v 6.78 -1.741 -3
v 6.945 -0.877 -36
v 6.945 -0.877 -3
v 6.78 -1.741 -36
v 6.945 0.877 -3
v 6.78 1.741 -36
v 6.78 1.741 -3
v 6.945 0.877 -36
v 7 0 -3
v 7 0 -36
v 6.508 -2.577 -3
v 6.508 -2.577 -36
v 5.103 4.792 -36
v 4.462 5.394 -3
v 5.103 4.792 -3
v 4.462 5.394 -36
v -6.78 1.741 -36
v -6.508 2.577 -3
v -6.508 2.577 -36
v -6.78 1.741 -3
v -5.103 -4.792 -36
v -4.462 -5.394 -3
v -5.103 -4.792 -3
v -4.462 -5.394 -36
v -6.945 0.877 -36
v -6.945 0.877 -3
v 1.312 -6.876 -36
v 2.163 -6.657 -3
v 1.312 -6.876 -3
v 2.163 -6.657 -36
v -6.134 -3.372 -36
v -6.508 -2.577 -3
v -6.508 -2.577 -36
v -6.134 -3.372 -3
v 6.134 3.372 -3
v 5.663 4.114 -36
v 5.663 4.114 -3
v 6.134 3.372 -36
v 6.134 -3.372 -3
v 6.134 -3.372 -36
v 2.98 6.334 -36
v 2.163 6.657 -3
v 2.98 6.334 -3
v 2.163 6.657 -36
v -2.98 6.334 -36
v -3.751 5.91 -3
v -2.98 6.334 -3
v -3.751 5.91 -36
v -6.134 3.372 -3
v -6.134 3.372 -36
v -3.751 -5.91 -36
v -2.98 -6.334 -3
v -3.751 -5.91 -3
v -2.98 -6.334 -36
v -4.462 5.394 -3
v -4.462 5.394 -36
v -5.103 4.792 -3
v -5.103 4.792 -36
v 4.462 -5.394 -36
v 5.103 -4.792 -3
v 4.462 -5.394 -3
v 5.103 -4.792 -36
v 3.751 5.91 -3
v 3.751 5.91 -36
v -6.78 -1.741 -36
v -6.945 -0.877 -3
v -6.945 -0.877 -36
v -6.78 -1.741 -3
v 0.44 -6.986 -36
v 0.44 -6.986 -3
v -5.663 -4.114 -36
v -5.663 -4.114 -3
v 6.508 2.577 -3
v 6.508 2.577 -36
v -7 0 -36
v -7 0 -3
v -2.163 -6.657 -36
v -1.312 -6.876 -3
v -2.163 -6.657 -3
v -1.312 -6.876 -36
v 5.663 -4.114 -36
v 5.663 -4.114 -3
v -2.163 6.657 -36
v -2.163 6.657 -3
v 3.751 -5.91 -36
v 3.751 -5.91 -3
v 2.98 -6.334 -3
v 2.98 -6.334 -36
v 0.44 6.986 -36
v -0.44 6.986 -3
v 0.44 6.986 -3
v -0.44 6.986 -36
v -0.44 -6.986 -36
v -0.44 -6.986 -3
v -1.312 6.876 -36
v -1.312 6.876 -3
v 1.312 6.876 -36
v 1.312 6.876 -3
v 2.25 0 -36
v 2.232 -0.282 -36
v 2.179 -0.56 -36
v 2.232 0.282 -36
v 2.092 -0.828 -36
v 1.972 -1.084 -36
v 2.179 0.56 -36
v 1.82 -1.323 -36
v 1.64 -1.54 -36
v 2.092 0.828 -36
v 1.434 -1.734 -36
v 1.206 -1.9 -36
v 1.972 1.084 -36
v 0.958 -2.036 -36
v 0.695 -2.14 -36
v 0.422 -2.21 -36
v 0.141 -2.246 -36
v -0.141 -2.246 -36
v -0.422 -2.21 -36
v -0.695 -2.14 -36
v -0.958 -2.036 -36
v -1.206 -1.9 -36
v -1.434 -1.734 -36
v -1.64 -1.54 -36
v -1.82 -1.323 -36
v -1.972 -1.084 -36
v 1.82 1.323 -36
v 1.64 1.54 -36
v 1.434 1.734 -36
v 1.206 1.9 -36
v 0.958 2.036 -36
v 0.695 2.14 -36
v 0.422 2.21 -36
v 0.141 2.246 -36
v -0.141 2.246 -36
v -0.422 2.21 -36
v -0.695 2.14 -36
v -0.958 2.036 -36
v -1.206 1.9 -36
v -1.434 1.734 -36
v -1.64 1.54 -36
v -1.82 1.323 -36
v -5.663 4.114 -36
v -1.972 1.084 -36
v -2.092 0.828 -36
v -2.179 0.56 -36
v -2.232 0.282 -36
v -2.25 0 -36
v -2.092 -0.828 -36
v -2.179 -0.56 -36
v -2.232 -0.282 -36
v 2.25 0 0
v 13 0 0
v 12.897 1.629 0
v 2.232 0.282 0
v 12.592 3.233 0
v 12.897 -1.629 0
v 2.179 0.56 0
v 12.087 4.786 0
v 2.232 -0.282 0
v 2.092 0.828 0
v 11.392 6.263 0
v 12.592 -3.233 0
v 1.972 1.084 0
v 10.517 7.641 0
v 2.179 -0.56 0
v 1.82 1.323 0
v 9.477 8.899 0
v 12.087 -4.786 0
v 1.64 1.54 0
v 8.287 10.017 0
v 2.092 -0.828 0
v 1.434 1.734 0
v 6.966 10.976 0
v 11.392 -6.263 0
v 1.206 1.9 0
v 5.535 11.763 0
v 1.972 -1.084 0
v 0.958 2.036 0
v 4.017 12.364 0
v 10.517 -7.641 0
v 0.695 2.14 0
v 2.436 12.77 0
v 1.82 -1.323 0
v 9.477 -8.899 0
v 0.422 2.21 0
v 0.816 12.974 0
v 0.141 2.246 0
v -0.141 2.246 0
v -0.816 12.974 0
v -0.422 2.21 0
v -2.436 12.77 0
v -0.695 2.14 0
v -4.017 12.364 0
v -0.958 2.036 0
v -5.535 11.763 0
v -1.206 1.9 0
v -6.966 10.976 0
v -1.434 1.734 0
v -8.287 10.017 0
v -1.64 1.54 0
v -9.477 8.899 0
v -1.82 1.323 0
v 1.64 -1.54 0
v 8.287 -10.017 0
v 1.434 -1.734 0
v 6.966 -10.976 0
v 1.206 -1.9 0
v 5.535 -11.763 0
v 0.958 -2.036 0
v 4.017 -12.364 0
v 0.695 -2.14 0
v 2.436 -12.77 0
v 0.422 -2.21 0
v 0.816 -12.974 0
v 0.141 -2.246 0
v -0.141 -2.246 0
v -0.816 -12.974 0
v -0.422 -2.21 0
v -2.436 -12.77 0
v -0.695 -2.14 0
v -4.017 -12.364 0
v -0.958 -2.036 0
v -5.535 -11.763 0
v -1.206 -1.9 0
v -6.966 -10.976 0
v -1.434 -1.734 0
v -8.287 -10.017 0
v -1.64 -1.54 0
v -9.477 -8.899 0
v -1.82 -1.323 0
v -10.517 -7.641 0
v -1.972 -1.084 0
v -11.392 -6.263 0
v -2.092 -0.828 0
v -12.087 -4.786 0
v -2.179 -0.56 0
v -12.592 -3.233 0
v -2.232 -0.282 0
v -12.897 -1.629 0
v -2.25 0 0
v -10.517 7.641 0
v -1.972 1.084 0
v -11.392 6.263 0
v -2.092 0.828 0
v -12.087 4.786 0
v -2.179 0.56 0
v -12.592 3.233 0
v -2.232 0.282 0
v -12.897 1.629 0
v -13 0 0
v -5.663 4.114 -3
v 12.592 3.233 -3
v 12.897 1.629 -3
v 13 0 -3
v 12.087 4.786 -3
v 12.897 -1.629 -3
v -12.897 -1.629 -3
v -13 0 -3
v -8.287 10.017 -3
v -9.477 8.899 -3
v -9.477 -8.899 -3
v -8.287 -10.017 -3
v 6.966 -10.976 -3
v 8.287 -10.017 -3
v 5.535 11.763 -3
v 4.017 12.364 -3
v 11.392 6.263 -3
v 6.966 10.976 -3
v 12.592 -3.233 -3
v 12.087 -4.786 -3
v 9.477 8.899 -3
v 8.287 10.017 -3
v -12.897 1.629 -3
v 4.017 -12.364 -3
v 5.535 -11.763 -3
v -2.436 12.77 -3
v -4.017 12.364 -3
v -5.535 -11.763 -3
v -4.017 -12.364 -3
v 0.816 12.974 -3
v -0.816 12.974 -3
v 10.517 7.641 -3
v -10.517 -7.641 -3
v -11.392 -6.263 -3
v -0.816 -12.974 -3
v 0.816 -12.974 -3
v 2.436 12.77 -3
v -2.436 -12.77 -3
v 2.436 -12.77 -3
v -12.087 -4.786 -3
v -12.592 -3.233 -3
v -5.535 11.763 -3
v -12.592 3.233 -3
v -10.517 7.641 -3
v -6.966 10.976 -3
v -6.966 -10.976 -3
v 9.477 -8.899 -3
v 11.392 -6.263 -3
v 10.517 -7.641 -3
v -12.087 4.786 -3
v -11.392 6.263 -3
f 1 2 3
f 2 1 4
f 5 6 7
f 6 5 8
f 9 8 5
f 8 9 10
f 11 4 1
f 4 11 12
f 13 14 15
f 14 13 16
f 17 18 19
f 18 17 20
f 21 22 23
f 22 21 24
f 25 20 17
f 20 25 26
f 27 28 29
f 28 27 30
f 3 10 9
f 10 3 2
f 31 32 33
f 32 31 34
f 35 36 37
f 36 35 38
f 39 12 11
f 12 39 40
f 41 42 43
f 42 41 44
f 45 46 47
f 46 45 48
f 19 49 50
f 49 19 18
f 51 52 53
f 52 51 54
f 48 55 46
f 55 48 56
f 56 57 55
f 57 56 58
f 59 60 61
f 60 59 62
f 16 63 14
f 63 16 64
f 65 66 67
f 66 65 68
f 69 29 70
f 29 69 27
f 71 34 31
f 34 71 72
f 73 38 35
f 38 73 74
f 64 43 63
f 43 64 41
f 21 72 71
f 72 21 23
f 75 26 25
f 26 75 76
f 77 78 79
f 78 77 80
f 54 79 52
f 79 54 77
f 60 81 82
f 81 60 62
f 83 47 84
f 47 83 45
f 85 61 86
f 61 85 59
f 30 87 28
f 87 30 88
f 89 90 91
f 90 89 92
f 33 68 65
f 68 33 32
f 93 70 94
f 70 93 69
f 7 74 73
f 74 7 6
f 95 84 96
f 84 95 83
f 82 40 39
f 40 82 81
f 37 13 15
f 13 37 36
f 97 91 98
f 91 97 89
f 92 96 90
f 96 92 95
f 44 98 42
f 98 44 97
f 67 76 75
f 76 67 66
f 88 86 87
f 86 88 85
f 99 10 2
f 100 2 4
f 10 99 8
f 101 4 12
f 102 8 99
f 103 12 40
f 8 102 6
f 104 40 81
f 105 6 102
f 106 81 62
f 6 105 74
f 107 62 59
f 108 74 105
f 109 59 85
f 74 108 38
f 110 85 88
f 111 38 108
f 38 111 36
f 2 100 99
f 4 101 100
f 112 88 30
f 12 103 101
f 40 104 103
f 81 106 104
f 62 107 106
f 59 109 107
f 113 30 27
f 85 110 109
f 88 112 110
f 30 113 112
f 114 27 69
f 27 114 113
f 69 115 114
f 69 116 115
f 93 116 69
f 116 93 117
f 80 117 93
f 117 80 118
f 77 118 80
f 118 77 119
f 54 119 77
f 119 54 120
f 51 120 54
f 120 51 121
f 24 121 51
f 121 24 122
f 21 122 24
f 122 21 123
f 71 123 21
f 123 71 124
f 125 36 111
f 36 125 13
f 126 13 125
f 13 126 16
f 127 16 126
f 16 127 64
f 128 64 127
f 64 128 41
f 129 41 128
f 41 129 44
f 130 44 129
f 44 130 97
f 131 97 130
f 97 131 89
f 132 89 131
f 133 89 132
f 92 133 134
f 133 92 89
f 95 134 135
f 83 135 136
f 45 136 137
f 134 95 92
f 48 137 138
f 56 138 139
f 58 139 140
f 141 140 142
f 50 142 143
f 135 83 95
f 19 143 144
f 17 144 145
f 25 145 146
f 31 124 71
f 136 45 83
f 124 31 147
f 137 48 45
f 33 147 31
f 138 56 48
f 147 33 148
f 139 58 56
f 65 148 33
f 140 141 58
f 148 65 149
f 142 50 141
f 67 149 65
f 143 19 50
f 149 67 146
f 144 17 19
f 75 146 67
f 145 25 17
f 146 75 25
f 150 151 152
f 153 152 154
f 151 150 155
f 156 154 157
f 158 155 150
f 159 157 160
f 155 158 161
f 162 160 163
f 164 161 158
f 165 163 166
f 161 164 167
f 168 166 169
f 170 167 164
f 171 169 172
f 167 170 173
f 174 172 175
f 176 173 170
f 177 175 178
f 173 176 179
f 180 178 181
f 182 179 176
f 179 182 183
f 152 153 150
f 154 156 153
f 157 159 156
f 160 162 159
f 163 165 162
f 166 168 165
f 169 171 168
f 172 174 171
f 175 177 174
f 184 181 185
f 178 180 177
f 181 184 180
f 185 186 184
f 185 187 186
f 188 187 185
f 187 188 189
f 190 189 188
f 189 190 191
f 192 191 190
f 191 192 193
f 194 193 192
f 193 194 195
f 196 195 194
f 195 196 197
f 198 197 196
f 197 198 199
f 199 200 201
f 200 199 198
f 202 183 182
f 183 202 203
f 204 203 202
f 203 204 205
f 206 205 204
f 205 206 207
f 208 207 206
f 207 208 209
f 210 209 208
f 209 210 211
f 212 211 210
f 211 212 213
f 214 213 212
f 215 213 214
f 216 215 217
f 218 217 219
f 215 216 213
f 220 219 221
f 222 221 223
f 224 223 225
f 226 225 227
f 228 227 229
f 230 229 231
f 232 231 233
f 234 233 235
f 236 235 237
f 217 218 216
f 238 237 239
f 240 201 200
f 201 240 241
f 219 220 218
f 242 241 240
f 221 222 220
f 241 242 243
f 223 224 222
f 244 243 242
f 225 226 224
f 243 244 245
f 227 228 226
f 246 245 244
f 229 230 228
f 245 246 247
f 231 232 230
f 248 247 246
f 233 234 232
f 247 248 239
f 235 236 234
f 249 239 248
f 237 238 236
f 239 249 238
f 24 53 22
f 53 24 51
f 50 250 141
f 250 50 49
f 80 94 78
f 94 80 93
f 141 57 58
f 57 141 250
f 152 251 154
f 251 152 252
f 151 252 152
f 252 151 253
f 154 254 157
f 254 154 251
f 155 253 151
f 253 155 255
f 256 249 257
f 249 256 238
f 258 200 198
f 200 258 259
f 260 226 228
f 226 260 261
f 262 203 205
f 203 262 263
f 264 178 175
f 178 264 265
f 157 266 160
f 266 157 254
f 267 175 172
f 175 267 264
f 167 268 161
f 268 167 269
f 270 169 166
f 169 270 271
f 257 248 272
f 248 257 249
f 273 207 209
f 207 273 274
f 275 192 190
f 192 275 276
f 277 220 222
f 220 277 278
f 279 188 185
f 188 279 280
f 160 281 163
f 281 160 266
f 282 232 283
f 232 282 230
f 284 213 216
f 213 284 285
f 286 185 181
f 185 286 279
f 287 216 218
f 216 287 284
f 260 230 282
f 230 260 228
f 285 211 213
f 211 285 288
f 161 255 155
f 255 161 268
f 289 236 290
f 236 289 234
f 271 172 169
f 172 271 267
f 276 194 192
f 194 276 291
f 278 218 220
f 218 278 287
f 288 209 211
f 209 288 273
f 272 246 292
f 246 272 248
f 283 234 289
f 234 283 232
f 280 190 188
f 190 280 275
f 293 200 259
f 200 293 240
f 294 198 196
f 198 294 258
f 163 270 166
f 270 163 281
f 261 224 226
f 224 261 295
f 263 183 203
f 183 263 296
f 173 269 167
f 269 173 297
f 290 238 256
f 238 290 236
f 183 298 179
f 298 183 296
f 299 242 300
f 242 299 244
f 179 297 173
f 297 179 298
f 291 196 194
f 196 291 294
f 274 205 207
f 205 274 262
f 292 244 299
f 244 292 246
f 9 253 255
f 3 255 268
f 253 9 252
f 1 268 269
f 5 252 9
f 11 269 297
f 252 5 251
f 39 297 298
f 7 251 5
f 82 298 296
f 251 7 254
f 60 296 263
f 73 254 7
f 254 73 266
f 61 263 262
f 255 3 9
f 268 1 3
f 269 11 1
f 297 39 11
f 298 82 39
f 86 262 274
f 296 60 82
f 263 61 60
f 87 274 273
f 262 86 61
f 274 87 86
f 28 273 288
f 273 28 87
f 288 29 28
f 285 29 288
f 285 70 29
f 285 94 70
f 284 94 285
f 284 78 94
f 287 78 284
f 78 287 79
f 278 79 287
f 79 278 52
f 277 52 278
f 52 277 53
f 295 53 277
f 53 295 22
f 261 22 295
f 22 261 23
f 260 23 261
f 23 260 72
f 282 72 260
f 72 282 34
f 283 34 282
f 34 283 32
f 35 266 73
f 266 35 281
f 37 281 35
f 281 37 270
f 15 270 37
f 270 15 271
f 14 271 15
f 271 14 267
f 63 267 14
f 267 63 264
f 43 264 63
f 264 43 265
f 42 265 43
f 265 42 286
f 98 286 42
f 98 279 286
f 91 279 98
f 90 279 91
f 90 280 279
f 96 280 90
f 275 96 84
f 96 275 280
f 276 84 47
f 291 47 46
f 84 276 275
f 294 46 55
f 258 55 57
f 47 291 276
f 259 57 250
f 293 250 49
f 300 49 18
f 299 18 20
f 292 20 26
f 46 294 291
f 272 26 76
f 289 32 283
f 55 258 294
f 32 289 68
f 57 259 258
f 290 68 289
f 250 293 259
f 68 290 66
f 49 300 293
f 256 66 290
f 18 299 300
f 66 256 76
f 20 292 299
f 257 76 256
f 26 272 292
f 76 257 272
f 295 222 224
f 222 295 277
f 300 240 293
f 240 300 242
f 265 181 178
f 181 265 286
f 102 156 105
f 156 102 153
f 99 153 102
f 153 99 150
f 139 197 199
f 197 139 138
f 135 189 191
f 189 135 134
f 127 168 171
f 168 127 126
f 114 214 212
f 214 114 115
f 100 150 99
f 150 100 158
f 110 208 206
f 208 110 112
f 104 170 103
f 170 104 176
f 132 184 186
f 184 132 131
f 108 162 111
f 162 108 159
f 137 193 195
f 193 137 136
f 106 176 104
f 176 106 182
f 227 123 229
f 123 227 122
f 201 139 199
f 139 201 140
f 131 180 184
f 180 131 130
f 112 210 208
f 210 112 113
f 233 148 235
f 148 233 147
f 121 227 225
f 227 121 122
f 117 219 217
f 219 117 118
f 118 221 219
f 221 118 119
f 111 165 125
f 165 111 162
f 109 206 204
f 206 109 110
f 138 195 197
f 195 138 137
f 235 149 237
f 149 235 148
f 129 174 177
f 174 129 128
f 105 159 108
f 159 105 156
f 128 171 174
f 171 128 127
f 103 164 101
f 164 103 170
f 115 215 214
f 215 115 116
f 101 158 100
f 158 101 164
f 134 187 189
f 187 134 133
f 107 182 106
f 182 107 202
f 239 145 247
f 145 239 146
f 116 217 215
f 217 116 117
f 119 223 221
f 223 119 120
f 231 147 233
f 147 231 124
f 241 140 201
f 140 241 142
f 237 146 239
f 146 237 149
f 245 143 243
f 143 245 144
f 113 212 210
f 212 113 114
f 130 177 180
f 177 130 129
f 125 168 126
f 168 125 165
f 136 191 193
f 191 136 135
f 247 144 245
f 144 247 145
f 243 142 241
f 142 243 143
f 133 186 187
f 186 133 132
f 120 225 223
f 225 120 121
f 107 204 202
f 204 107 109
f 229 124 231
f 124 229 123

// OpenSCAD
$fn = 50;


difference() {
	union() {
		translate(v = [0, 0, -36.0000000000]) {
			cylinder(h = 36, r = 7.0000000000);
		}
		translate(v = [0, 0, -3.0000000000]) {
			cylinder(h = 3, r = 13.0000000000);
		}
	}
	union() {
		#translate(v = [0, 0, -36]) {
			cylinder(h = 36, r = 2.2500000000);
		}
	}
}
